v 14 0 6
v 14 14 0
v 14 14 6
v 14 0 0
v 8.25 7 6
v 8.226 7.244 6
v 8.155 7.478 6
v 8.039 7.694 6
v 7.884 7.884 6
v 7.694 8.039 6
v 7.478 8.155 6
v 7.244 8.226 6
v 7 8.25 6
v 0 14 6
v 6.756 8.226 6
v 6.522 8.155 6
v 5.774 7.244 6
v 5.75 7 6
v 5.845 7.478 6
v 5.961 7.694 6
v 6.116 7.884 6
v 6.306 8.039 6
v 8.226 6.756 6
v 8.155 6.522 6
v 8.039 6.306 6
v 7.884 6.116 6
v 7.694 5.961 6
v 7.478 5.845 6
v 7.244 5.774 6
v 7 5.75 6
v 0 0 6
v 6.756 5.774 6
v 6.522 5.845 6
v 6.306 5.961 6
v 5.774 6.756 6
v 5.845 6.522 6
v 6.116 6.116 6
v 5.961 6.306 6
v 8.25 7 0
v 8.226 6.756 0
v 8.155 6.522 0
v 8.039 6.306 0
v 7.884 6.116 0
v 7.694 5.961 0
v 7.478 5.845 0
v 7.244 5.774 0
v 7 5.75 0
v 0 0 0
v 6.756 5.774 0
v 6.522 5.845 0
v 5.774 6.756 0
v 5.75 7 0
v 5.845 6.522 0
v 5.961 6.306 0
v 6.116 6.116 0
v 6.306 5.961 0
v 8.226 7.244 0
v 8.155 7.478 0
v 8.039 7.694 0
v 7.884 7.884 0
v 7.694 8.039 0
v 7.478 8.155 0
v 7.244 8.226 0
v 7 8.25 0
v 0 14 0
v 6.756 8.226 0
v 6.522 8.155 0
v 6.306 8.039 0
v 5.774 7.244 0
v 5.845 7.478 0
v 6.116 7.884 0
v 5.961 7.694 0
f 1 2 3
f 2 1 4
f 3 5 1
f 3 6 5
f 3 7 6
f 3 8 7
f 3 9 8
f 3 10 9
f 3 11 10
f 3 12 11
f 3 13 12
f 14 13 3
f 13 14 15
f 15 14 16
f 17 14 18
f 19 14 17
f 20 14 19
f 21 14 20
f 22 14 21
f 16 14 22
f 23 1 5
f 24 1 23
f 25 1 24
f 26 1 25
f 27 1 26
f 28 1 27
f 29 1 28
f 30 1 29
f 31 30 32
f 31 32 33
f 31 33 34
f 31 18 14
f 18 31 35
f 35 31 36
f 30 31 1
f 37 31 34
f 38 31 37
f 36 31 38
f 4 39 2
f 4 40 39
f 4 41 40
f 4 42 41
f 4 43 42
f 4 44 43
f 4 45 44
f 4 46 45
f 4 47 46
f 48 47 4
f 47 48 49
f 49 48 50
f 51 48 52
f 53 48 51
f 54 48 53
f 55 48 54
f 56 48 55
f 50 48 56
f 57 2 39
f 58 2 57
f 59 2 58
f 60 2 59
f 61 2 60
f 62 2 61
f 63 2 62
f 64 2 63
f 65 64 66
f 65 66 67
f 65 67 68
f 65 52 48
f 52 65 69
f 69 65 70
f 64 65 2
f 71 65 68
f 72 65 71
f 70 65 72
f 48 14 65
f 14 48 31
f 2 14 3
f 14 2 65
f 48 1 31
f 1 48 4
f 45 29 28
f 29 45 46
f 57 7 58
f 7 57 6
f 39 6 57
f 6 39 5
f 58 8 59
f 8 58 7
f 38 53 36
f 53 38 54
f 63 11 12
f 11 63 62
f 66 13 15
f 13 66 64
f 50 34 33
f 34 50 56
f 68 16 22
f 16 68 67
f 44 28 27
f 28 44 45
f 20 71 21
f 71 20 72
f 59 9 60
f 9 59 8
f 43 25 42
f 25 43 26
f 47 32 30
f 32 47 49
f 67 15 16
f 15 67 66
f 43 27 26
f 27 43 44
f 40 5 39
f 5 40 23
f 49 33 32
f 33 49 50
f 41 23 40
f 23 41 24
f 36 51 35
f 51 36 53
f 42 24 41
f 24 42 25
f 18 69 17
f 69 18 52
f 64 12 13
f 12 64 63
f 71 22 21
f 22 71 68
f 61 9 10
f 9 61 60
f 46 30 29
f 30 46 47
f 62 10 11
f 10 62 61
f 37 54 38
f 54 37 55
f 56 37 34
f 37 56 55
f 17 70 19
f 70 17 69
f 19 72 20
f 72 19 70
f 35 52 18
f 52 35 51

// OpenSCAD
$fn = 32;

// ----------------------------------------------------------------------
// Micro pad: drilled pad, 5-20 mm class
// ----------------------------------------------------------------------

// --- parameters (mm) ---
pad_l = 14;               // pad length, X
pad_w = 14;               // pad width, Y
pad_t = 6;                // pad thickness, Z
hole_d = 2.5;             // through hole diameter

difference() {
  cube([pad_l, pad_w, pad_t]);
  translate([pad_l / 2, pad_w / 2, -1])
    cylinder(h = pad_t + 2, d = hole_d);
}
